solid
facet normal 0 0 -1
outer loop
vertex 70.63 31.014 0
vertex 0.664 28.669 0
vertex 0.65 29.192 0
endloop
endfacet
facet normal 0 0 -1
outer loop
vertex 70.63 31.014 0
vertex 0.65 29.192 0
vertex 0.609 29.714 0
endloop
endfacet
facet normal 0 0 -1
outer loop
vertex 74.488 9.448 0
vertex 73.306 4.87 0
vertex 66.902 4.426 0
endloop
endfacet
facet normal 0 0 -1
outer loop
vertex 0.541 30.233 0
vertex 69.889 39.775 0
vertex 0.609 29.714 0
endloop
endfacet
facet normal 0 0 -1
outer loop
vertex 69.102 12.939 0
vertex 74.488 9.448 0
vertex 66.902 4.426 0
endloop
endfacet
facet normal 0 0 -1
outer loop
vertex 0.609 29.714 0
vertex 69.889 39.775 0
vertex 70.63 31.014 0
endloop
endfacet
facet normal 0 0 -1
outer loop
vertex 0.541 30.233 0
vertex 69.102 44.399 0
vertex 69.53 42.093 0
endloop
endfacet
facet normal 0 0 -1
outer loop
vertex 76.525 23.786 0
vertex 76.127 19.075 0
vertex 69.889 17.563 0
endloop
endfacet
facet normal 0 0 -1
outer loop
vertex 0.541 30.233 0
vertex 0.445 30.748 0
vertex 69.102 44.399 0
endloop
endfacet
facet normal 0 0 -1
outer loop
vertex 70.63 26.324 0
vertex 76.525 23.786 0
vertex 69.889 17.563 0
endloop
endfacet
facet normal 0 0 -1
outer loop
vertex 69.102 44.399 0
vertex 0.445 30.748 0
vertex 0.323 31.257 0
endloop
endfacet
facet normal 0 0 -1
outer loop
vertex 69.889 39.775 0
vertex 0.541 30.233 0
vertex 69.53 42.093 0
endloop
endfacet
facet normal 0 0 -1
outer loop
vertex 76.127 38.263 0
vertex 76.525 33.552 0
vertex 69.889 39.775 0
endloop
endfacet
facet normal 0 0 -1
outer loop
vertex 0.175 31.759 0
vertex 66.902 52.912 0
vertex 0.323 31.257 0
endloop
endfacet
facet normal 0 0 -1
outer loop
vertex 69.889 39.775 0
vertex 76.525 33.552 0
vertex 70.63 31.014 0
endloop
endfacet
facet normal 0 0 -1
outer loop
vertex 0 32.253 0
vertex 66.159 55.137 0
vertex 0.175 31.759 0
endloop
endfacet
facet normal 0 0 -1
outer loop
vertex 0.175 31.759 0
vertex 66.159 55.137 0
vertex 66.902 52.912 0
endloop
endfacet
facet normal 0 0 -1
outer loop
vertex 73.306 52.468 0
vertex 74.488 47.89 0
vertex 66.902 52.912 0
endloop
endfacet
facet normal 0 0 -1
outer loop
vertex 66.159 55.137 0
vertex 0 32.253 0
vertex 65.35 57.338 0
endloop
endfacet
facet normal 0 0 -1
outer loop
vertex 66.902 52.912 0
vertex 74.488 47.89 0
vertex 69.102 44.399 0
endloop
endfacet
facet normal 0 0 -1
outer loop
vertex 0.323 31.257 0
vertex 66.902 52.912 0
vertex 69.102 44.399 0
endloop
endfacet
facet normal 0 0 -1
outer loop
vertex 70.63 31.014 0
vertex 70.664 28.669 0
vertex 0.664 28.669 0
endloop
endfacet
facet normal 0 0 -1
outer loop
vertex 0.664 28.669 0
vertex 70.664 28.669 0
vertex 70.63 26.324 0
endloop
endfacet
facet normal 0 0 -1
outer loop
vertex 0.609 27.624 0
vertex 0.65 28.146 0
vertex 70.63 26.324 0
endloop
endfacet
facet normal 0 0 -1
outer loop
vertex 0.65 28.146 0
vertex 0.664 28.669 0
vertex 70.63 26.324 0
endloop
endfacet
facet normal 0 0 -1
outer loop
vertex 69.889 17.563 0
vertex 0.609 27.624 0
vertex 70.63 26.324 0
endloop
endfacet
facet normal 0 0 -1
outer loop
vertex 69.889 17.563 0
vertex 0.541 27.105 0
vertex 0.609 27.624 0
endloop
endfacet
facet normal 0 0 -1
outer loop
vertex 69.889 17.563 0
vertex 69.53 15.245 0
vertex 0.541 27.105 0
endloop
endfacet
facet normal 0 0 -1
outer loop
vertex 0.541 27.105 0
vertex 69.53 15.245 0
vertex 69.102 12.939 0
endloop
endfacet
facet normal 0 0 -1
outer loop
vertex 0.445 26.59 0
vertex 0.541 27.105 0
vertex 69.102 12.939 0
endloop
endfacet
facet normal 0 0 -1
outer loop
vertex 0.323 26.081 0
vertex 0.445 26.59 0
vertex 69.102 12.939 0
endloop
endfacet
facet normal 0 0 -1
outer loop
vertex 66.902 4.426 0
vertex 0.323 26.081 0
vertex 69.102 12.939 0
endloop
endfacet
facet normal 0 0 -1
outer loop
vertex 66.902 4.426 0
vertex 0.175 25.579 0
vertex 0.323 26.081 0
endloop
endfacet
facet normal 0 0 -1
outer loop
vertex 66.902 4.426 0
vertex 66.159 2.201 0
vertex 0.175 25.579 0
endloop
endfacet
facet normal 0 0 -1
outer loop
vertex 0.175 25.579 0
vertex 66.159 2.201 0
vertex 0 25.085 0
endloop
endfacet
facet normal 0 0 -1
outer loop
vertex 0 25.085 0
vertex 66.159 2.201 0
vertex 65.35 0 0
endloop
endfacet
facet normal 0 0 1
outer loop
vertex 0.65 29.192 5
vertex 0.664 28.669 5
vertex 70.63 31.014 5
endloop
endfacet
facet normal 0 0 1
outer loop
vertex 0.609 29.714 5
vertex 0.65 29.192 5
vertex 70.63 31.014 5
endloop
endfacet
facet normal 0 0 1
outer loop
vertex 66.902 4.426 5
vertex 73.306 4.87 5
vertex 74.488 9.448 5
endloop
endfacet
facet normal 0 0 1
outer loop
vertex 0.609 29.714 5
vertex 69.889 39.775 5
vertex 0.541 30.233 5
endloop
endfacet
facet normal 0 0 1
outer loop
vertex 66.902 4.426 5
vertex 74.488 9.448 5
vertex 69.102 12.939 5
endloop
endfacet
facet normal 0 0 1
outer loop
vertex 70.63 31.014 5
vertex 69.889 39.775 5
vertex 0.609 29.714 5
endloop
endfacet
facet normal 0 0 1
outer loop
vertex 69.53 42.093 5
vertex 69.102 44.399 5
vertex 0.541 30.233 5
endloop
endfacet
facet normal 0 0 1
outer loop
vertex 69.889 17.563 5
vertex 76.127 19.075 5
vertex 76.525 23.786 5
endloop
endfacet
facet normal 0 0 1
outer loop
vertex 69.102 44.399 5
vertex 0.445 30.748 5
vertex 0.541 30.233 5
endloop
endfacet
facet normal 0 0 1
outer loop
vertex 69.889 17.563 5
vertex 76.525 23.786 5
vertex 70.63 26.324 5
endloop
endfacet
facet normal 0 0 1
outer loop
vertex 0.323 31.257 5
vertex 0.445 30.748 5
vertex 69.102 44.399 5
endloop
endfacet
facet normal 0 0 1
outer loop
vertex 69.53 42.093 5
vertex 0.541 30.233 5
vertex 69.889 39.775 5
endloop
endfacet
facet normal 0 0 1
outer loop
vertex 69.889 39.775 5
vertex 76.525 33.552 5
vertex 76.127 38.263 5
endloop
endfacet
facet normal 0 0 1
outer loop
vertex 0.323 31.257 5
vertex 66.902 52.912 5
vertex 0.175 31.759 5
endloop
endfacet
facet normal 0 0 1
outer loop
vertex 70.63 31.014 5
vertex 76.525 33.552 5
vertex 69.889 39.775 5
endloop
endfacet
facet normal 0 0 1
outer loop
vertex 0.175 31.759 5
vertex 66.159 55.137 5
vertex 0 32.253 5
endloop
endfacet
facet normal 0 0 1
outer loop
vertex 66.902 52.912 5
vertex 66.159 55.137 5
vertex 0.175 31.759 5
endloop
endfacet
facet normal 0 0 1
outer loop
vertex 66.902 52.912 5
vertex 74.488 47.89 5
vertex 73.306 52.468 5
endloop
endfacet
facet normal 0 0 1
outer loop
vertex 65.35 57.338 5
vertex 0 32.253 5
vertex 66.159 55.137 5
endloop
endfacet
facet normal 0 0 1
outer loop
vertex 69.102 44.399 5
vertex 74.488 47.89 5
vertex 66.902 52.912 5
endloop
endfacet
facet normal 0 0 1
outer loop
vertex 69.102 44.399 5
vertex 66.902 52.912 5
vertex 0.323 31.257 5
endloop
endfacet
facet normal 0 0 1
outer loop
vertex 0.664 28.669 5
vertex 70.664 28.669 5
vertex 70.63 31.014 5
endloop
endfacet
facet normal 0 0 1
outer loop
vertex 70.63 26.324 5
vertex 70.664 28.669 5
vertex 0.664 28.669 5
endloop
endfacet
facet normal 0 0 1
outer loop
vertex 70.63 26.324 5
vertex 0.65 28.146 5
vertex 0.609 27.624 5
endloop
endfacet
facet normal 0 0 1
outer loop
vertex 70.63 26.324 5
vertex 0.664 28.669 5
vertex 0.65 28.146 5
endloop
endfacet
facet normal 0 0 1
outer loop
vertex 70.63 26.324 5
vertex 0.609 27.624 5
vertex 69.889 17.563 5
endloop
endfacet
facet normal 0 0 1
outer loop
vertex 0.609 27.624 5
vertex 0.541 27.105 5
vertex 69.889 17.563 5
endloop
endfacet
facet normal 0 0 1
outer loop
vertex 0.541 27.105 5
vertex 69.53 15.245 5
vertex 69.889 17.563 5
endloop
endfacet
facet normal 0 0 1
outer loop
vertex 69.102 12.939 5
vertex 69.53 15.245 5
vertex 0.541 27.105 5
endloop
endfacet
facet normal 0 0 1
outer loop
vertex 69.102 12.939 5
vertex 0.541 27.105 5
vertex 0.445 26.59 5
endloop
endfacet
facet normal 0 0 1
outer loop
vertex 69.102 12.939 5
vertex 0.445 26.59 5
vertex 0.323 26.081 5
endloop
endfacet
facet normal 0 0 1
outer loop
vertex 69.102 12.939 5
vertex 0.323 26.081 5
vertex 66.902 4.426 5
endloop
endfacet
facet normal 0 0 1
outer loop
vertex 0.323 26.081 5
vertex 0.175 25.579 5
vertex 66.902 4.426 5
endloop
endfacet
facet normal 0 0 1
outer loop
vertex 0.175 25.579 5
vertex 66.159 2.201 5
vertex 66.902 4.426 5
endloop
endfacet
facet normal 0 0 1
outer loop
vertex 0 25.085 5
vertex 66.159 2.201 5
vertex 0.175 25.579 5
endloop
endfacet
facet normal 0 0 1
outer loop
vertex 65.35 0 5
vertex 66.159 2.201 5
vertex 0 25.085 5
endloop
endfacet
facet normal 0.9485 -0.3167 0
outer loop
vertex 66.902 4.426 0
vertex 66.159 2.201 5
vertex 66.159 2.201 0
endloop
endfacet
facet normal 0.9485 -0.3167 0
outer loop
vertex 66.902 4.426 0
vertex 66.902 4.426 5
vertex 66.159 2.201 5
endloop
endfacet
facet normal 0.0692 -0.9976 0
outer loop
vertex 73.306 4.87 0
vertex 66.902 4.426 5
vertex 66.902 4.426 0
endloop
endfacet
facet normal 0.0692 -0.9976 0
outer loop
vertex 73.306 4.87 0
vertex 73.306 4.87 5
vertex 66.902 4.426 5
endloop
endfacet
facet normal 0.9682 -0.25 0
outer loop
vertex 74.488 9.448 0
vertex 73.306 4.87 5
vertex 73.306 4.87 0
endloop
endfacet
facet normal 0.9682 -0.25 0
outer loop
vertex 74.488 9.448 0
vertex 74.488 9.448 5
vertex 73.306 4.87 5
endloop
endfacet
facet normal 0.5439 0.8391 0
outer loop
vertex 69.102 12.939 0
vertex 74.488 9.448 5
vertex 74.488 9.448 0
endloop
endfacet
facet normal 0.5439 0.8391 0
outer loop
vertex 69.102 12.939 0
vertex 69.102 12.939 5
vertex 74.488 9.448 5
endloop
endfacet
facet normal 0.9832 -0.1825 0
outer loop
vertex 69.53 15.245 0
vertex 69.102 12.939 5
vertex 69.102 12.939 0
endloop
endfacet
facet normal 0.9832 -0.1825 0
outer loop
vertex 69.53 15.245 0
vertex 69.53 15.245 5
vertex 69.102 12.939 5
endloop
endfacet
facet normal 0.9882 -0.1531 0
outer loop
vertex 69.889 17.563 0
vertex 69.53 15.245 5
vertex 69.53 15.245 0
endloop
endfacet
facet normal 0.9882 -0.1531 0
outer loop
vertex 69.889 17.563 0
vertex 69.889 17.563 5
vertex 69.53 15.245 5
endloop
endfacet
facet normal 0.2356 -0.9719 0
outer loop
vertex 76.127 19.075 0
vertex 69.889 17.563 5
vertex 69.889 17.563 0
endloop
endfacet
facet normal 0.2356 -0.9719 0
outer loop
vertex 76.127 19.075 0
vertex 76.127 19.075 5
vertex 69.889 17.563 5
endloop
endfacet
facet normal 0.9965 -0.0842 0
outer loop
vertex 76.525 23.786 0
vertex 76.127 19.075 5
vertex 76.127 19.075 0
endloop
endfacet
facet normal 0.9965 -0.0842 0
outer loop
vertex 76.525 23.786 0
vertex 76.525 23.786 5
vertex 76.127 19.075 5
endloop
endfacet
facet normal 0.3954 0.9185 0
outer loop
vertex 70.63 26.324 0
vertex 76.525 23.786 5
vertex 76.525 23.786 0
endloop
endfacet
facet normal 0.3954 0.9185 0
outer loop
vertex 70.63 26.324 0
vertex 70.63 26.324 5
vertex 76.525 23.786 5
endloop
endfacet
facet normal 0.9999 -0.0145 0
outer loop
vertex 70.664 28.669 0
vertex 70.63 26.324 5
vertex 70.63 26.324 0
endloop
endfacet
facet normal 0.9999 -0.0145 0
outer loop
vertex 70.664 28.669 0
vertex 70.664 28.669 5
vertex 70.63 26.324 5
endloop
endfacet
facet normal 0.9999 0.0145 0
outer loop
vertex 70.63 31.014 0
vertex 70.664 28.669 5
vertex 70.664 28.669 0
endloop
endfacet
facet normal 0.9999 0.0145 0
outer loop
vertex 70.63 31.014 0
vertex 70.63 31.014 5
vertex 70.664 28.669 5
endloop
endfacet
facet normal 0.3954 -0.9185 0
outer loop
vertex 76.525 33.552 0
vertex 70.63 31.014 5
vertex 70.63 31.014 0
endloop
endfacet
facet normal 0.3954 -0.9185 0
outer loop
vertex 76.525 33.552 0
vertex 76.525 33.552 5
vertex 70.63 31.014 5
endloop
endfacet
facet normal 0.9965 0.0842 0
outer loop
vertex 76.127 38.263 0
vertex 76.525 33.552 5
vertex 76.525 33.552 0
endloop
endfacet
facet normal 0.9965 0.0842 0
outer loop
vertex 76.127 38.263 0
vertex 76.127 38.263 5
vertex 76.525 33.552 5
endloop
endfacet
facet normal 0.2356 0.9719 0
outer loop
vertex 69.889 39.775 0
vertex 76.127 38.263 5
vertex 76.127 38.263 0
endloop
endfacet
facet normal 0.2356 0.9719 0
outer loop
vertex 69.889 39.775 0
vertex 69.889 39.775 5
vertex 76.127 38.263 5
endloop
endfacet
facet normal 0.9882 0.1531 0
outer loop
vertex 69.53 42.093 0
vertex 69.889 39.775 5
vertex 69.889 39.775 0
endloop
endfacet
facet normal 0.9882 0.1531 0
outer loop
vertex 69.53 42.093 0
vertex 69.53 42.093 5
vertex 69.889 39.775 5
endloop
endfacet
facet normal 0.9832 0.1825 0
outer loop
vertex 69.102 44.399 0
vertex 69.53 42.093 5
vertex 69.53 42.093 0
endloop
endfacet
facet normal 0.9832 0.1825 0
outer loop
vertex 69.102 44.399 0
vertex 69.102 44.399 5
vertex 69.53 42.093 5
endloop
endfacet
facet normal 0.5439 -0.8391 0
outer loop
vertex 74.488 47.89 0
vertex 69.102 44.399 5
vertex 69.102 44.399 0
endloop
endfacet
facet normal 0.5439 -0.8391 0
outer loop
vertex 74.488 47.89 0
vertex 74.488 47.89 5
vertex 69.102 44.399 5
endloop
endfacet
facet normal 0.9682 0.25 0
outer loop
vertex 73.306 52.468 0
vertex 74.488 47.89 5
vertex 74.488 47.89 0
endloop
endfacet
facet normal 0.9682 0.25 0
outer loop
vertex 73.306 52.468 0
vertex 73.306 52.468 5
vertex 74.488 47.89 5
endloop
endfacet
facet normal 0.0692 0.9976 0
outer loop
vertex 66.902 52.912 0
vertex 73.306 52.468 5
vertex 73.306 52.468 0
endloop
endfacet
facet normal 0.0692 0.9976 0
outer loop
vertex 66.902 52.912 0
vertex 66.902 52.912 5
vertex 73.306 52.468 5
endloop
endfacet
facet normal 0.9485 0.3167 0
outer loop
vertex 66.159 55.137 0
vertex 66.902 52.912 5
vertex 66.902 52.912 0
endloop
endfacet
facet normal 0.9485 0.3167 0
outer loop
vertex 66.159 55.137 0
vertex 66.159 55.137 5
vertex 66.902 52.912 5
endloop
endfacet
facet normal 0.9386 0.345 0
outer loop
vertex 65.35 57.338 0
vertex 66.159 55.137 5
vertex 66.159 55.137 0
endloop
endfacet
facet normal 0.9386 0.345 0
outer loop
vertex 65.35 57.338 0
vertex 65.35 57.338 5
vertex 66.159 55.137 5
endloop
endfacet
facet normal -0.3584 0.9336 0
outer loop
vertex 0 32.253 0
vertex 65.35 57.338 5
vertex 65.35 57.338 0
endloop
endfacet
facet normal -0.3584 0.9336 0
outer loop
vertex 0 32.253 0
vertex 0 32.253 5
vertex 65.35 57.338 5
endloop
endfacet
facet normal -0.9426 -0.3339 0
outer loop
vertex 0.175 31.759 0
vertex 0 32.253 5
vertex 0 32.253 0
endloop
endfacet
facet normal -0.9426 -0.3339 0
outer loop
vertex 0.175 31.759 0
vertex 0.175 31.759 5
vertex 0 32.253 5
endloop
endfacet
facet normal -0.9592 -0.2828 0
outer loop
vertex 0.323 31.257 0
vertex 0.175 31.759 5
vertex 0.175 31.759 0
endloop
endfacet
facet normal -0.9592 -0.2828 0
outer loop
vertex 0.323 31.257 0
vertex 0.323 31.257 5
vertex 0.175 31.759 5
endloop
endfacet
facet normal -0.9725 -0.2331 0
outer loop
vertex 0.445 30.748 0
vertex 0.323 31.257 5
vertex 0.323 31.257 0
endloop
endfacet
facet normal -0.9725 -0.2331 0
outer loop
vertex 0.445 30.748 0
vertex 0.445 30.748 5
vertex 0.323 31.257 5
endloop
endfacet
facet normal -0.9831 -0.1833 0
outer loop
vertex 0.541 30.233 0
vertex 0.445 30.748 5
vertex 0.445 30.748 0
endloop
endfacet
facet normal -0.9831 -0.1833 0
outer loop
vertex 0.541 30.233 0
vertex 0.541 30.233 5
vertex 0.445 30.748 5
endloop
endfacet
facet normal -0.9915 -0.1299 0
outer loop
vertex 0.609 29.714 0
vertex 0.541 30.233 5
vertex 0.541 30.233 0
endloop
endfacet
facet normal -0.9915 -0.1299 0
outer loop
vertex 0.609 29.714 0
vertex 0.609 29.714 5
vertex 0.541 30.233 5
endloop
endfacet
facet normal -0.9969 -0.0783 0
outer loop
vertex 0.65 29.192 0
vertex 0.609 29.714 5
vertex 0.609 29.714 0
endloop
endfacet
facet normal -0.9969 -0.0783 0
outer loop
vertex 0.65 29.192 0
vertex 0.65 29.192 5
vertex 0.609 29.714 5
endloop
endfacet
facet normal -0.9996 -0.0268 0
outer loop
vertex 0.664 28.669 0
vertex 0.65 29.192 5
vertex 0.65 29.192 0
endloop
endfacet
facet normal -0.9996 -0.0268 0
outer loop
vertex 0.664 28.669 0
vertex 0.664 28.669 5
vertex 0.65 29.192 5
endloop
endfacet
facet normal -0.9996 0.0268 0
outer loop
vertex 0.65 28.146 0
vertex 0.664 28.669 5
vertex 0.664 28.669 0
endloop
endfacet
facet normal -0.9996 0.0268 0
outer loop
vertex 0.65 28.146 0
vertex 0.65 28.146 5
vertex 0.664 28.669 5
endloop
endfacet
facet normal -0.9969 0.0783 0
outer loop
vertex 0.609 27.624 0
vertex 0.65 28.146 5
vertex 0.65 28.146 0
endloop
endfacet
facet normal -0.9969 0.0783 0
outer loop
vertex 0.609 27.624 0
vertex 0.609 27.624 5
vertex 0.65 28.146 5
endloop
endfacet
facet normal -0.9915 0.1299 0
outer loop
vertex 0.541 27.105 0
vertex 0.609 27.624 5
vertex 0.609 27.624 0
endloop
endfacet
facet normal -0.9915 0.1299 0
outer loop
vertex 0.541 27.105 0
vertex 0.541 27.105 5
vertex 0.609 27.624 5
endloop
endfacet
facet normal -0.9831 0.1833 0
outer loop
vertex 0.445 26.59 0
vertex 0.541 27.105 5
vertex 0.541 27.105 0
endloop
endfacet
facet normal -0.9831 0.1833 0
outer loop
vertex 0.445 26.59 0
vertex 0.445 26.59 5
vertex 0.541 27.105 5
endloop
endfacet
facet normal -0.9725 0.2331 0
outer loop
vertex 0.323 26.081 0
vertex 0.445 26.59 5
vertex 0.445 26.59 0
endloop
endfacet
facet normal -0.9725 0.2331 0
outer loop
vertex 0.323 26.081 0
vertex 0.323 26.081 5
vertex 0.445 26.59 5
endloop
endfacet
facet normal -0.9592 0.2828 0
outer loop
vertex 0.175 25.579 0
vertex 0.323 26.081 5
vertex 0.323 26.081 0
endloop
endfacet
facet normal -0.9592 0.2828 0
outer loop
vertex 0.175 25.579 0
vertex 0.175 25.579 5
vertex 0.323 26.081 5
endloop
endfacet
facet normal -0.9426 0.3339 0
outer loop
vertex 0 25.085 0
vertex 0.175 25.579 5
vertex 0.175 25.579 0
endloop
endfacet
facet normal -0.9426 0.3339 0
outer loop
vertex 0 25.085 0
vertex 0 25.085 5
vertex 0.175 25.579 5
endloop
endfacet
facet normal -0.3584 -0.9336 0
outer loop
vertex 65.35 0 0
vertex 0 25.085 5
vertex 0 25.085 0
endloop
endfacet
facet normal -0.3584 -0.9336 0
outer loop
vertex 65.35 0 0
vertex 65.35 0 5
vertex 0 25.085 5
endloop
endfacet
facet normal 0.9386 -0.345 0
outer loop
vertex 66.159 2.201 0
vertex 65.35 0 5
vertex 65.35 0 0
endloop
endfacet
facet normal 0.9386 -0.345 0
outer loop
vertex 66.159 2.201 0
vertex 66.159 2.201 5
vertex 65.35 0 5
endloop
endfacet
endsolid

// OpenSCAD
$fn = 32;

// ----------------------------------------------------------------------
// Gear sector: 4 teeth on 42 degrees
// ----------------------------------------------------------------------

// --- parameters (mm) ---
sector_angle = 42;        // sector angle, degrees
root_r = 80;              // root circle radius
tooth_h = 6;              // tooth height over the root circle
teeth = 4;                // number of teeth on the sector
hub_r = 10;               // hub bore radius
plate_t = 5;              // sector thickness, Z
arc_step = 3;             // sampling step of the root/hub arcs, degrees

tip_r = root_r + tooth_h;  // tip circle radius

profile = [[65.35, 0], [66.159, 2.201], [66.902, 4.426], [73.306, 4.87], [74.488, 9.448], [69.102, 12.939], [69.53, 15.245], [69.889, 17.563], [76.127, 19.075], [76.525, 23.786], [70.63, 26.324], [70.664, 28.669], [70.63, 31.014], [76.525, 33.552], [76.127, 38.263], [69.889, 39.775], [69.53, 42.093], [69.102, 44.399], [74.488, 47.89], [73.306, 52.468], [66.902, 52.912], [66.159, 55.137], [65.35, 57.338], [0, 32.253], [0.175, 31.759], [0.323, 31.257], [0.445, 30.748], [0.541, 30.233], [0.609, 29.714], [0.65, 29.192], [0.664, 28.669], [0.65, 28.146], [0.609, 27.624], [0.541, 27.105], [0.445, 26.59], [0.323, 26.081], [0.175, 25.579], [0, 25.085]];  // primary outline, 38 points, counter clockwise

// --- the one profile operation ---
linear_extrude(height = plate_t) polygon(points = profile);
